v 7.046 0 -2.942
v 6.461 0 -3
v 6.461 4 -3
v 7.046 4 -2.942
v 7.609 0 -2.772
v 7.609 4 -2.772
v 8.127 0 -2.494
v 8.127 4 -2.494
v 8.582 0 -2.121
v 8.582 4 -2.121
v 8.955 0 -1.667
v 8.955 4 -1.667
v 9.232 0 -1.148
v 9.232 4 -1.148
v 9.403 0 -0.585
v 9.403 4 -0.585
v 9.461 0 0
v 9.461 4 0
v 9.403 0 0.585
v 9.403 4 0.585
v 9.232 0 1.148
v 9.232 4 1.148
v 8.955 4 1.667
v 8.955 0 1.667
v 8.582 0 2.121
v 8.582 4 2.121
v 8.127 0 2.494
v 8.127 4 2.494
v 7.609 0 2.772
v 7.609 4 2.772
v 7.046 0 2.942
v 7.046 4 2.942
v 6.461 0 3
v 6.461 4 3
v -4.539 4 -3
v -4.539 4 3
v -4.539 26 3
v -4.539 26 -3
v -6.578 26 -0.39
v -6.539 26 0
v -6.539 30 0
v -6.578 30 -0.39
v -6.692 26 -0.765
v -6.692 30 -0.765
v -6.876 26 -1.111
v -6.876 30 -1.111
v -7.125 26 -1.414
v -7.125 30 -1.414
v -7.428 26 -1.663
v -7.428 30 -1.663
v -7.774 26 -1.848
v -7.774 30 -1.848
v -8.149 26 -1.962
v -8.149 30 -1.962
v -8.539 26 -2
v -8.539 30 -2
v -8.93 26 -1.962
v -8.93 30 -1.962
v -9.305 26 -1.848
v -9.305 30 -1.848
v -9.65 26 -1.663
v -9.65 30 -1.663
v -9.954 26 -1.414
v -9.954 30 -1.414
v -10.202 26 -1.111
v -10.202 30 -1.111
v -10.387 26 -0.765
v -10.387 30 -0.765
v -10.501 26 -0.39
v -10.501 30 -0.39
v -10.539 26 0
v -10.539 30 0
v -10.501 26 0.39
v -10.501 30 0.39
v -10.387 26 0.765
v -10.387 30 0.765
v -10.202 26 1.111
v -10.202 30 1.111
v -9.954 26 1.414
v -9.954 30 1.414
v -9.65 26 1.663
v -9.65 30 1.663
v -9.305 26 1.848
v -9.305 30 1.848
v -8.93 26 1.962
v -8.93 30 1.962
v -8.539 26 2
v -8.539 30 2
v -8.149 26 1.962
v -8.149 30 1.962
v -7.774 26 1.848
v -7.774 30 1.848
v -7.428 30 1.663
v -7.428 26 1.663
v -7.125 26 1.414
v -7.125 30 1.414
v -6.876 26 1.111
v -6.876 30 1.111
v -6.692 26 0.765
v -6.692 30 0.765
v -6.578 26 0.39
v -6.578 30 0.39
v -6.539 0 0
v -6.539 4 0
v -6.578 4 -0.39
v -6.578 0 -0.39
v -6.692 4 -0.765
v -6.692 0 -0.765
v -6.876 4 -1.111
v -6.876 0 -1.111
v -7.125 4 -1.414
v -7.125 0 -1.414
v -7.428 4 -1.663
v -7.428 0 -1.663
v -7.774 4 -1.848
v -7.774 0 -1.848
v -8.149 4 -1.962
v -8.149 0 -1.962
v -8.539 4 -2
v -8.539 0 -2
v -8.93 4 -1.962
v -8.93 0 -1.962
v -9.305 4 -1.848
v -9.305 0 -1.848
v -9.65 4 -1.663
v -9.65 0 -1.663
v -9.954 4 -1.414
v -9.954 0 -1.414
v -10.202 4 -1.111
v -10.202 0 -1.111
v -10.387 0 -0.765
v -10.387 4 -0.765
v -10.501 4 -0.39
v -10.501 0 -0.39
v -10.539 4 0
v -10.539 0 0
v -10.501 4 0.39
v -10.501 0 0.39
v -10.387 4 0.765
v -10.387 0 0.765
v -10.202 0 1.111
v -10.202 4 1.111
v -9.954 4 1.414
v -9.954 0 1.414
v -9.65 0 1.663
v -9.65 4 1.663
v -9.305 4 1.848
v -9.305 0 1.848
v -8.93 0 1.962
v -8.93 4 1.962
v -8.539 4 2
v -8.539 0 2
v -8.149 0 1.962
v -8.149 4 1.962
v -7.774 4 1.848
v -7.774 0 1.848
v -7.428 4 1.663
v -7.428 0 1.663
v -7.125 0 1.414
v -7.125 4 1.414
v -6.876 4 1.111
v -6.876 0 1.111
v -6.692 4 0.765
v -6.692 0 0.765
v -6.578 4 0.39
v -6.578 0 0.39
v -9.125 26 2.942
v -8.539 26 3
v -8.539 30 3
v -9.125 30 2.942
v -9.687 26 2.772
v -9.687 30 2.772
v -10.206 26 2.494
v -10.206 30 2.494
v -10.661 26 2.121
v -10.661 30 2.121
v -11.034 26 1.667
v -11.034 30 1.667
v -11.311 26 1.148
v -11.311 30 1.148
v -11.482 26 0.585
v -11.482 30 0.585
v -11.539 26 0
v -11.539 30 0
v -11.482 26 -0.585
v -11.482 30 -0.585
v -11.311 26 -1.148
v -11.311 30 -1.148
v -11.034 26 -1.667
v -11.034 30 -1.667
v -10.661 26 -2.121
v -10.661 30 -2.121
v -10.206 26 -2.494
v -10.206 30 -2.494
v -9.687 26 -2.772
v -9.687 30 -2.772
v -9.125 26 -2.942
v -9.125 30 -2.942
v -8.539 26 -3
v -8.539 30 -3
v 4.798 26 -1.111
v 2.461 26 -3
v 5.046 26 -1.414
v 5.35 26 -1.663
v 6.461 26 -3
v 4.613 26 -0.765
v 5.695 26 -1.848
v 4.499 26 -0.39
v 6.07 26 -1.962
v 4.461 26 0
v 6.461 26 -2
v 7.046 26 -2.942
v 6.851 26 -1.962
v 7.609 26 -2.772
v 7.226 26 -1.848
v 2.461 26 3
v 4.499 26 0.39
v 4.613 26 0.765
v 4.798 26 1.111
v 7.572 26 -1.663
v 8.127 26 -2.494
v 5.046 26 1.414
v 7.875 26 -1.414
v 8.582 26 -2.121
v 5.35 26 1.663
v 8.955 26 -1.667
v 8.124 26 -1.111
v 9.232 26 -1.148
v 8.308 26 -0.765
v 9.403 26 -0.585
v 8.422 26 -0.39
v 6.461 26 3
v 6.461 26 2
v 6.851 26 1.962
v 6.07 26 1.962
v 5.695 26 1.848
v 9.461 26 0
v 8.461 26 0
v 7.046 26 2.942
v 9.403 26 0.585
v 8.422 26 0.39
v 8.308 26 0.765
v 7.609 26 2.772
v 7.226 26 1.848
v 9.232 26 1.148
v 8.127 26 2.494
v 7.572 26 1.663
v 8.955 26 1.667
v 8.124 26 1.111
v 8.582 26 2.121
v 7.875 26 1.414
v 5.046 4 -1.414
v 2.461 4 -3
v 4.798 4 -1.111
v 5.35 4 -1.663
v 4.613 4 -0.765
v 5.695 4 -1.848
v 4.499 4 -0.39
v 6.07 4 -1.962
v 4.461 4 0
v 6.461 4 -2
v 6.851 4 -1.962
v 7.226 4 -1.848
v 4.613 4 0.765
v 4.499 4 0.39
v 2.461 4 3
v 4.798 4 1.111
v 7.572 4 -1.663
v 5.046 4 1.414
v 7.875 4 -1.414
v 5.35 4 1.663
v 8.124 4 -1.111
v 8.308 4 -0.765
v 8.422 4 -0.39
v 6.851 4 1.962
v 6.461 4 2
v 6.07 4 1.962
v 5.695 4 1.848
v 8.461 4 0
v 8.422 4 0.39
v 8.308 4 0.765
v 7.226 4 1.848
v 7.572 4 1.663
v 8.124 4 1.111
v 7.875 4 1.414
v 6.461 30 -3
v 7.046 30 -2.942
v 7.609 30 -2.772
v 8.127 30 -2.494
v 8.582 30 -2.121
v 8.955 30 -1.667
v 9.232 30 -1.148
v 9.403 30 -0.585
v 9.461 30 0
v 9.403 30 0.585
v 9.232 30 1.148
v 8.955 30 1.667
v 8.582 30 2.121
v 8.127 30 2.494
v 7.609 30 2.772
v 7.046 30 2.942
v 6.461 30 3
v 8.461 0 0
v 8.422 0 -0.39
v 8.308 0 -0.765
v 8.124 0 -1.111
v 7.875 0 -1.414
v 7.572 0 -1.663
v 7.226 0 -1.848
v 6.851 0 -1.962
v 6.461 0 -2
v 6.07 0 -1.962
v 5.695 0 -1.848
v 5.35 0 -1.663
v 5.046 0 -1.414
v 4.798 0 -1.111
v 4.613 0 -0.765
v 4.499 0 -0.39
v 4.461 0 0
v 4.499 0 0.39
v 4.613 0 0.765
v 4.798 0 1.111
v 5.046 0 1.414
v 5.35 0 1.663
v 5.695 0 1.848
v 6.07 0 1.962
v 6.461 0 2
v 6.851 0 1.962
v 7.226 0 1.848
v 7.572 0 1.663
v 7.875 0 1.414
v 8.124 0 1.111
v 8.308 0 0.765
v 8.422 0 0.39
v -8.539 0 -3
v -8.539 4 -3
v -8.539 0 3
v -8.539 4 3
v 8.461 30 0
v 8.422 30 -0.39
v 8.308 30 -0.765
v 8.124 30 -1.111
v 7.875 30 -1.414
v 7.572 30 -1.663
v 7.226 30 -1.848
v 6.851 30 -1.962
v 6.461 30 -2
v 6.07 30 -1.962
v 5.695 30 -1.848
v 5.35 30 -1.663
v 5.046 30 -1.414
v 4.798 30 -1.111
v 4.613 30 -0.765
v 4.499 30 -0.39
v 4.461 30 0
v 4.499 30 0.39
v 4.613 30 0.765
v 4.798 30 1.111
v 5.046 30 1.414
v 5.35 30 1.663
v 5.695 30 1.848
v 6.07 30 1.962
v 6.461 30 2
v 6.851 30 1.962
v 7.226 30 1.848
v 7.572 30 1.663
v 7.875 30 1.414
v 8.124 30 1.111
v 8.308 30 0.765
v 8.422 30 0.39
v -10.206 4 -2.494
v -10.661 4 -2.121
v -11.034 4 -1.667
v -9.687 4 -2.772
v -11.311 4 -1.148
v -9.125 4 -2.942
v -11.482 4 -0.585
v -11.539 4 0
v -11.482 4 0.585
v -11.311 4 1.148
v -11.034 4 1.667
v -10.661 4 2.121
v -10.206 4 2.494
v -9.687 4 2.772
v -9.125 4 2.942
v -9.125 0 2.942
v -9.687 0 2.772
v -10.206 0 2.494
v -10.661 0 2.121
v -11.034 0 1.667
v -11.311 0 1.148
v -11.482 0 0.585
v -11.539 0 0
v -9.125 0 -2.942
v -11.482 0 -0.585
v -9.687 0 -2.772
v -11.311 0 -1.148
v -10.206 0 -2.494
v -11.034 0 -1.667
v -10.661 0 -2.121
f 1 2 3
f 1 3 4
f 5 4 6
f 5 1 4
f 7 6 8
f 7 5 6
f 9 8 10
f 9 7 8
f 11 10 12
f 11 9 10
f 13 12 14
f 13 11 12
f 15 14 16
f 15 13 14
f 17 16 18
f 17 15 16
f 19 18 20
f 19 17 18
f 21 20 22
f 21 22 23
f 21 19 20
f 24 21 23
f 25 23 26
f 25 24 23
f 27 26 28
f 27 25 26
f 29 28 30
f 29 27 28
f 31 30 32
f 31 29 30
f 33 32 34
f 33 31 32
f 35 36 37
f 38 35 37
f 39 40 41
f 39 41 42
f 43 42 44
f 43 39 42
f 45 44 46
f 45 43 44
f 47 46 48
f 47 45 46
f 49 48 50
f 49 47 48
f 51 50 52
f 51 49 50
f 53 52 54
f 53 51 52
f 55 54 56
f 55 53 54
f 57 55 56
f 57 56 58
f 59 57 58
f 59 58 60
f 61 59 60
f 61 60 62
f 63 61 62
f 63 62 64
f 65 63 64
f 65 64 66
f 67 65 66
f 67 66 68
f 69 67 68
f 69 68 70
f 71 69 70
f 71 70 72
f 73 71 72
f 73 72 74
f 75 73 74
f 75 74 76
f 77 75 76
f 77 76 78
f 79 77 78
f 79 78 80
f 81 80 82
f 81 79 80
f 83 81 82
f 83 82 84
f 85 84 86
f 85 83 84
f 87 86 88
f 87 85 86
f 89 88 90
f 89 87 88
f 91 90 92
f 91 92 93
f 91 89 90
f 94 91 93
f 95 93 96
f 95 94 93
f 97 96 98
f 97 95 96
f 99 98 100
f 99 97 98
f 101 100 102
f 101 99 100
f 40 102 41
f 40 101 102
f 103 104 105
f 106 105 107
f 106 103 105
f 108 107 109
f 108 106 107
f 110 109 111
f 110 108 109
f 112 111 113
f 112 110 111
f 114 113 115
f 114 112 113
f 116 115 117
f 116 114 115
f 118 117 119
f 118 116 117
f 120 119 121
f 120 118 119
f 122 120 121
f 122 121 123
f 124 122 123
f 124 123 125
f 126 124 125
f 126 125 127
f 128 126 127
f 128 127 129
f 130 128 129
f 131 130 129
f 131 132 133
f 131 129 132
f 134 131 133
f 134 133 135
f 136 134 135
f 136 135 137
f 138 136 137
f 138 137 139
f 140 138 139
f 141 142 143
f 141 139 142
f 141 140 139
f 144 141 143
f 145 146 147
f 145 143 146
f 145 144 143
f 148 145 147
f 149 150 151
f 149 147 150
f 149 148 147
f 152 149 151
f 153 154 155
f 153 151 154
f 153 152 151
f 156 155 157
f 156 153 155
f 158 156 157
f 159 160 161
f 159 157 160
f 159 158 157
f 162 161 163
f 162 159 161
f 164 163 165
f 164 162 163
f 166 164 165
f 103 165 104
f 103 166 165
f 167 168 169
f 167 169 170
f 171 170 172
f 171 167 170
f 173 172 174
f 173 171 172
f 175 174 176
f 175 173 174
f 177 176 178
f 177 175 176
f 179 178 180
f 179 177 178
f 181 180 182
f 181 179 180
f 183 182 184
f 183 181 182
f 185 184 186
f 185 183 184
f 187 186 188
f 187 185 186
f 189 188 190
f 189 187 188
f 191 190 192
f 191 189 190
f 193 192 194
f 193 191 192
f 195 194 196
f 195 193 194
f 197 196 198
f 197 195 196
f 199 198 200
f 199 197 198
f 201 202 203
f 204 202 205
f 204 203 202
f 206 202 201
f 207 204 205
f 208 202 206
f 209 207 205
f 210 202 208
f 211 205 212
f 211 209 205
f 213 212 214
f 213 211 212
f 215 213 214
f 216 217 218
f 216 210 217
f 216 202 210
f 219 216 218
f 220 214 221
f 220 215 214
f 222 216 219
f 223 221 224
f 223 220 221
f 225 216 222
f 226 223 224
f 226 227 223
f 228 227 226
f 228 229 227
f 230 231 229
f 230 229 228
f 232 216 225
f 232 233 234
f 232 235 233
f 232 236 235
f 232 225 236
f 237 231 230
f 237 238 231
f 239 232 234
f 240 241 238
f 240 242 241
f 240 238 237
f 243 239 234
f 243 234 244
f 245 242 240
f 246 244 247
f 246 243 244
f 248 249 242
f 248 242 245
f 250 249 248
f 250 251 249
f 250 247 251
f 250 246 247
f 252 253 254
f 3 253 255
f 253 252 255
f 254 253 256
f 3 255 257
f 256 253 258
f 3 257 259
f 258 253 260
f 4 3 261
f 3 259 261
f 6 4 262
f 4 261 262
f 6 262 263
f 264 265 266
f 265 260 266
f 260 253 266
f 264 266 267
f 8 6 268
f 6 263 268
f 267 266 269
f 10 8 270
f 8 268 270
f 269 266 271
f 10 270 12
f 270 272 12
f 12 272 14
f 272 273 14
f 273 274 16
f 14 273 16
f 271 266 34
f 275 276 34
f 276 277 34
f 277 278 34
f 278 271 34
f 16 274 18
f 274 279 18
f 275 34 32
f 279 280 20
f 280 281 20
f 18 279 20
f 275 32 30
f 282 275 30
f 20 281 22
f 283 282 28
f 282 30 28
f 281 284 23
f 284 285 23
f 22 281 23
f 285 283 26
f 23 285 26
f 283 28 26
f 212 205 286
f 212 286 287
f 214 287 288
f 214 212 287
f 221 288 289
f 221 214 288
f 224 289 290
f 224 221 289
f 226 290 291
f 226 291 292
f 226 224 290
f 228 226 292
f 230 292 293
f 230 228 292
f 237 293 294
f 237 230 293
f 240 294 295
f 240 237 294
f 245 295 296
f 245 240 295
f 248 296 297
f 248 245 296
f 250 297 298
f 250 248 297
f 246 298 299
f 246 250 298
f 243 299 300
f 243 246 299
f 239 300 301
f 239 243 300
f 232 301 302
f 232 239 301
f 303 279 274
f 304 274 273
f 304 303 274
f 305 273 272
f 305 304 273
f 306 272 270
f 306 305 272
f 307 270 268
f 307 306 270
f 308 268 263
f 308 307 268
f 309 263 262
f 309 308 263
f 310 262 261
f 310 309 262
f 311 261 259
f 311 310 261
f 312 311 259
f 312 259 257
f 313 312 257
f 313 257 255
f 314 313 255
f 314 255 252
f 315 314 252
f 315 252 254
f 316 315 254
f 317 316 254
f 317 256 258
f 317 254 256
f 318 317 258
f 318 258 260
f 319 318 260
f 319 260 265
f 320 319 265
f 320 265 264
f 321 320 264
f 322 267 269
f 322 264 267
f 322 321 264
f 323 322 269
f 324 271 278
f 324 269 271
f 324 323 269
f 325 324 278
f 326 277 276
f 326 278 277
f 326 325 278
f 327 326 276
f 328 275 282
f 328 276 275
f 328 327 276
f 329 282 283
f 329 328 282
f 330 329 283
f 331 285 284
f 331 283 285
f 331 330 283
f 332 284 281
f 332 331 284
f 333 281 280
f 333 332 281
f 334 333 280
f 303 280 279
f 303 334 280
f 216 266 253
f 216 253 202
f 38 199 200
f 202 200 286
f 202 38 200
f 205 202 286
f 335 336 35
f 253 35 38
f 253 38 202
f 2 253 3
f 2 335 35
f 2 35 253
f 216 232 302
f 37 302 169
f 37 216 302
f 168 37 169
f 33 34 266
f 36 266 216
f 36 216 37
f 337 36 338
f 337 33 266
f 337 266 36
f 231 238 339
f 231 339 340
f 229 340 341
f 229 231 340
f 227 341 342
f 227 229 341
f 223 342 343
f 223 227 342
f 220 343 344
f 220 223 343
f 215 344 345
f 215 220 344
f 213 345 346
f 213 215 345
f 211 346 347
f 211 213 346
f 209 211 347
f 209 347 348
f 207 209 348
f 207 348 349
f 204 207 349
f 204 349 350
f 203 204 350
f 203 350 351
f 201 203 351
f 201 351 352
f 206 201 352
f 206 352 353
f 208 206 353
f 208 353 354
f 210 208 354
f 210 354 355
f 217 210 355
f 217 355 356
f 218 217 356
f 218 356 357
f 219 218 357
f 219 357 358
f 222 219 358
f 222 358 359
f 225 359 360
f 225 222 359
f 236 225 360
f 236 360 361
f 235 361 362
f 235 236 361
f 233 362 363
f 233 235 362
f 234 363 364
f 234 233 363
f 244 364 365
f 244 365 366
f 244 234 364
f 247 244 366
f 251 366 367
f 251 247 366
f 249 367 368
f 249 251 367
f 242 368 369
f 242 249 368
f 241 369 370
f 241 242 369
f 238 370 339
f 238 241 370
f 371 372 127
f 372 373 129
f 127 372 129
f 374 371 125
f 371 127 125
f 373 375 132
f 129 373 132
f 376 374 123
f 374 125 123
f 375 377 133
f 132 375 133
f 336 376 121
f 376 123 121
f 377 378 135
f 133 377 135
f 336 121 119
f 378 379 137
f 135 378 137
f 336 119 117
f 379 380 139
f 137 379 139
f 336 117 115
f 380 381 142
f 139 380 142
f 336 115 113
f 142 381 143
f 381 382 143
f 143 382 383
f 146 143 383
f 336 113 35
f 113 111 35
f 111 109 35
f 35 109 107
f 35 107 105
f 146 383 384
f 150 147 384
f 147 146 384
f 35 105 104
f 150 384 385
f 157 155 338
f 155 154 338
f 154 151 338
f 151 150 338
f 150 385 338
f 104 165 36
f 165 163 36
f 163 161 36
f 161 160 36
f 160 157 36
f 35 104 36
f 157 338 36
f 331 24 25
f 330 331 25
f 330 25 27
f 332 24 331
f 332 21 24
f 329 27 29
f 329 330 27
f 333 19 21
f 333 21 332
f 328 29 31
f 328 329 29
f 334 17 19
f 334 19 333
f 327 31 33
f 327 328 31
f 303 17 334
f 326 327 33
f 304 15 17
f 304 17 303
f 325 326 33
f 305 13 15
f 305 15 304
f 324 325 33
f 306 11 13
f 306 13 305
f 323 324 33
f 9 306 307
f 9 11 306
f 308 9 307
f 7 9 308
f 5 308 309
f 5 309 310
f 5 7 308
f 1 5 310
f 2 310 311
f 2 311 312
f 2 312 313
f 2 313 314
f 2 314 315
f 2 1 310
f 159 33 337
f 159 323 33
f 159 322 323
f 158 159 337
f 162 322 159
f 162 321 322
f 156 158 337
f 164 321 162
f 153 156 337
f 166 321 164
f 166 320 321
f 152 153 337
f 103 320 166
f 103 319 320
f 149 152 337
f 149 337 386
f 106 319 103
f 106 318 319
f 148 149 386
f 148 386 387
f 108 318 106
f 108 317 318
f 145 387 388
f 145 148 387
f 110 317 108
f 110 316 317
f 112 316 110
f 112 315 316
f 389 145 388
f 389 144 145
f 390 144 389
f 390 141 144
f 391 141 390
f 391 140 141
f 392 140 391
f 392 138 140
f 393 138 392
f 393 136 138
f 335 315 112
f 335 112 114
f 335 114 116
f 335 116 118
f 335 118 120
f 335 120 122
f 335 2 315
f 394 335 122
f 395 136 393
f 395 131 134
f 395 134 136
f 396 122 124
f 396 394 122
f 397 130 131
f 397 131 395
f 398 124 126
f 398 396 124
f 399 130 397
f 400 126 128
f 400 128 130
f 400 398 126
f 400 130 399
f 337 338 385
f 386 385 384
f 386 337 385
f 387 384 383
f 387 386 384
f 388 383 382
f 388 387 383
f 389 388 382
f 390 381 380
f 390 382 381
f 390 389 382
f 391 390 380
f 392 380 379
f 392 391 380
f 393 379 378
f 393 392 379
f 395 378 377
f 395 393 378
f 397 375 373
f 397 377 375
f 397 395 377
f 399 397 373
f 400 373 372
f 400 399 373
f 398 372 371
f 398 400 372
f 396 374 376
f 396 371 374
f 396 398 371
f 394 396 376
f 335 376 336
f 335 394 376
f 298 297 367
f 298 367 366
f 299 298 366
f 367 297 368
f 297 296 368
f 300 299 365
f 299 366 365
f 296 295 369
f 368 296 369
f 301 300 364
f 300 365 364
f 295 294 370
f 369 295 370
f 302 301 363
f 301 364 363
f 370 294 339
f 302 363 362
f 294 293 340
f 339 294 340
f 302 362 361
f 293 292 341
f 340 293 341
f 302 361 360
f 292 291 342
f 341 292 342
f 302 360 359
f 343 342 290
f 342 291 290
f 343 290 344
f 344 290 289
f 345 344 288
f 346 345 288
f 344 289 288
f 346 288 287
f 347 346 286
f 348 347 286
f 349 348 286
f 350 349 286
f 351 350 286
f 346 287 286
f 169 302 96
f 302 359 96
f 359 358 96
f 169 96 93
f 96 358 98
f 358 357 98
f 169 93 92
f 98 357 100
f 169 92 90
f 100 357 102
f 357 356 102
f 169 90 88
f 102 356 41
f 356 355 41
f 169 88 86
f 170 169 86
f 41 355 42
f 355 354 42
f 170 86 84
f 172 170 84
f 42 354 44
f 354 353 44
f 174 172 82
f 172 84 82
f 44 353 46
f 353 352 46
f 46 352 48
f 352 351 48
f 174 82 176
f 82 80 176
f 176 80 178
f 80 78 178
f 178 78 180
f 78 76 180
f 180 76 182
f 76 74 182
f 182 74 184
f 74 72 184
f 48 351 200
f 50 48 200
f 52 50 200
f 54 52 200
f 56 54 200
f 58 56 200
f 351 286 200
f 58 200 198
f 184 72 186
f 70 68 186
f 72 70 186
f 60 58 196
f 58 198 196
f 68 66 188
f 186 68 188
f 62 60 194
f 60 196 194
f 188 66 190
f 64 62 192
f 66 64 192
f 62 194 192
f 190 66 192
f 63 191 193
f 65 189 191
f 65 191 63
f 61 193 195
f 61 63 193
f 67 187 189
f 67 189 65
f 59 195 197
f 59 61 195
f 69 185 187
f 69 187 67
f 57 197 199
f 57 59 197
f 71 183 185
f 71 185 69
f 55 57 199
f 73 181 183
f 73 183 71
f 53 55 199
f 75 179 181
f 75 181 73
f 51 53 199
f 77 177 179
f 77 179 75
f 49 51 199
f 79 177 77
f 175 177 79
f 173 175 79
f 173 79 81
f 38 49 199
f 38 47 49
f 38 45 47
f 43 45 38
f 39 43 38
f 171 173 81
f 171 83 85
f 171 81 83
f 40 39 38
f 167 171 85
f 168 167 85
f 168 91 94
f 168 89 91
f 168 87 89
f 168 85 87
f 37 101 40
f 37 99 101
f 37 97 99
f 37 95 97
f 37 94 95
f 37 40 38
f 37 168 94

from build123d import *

# Parameters (mm, degrees)
SKETCH1_R           = 2
BOSS_EXTRUDE1_DEPTH = 30
CUT_EXTRUDE1_REACH  = 8
SKETCH3_W           = 7
SKETCH3_H           = 22


with BuildPart() as part:
    # Sketch1 → Boss-Extrude1 (new body)
    with BuildSketch(Plane(origin=(0, 0, 0), x_dir=(1, 0, 0), z_dir=(0, 1, 0))):
        with BuildLine():
            Line((-8.539325843, 3), (6.460674157, 3))
            ThreePointArc((6.460674157, 3), (9.460674157, 0), (6.460674157, -3))
            Line((6.460674157, -3), (-8.539325843, -3))
            ThreePointArc((-8.539325843, -3), (-11.539325843, 0), (-8.539325843, 3))
        make_face()
        with Locations((-8.539325843, 0)):
            Circle(SKETCH1_R, mode=Mode.SUBTRACT)
        with Locations((6.460674157, 0)):
            Circle(SKETCH1_R, mode=Mode.SUBTRACT)
    extrude(amount=BOSS_EXTRUDE1_DEPTH)

    # Sketch3 → Cut-Extrude1 (cut, up to next)
    with BuildSketch(Plane.XY.offset(3), mode=Mode.PRIVATE) as cut_extrude1_sk1:
        with Locations((5.960674157, 15)):
            Rectangle(SKETCH3_W, SKETCH3_H)
    cut_extrude1_tool1 = extrude(cut_extrude1_sk1.sketch, amount=-CUT_EXTRUDE1_REACH, mode=Mode.PRIVATE) & part.part
    add(cut_extrude1_tool1.solids().sort_by_distance((5.960674, 15, 3))[0], mode=Mode.SUBTRACT)
    # Sketch3 → Cut-Extrude1 (cut, up to next)
    with BuildSketch(Plane.XY.offset(3), mode=Mode.PRIVATE) as cut_extrude1_sk2:
        with Locations((-8.039325843, 15)):
            Rectangle(SKETCH3_W, SKETCH3_H)
    cut_extrude1_tool2 = extrude(cut_extrude1_sk2.sketch, amount=-CUT_EXTRUDE1_REACH, mode=Mode.PRIVATE) & part.part
    add(cut_extrude1_tool2.solids().sort_by_distance((-8.039326, 15, 3))[0], mode=Mode.SUBTRACT)


solid = part.part
